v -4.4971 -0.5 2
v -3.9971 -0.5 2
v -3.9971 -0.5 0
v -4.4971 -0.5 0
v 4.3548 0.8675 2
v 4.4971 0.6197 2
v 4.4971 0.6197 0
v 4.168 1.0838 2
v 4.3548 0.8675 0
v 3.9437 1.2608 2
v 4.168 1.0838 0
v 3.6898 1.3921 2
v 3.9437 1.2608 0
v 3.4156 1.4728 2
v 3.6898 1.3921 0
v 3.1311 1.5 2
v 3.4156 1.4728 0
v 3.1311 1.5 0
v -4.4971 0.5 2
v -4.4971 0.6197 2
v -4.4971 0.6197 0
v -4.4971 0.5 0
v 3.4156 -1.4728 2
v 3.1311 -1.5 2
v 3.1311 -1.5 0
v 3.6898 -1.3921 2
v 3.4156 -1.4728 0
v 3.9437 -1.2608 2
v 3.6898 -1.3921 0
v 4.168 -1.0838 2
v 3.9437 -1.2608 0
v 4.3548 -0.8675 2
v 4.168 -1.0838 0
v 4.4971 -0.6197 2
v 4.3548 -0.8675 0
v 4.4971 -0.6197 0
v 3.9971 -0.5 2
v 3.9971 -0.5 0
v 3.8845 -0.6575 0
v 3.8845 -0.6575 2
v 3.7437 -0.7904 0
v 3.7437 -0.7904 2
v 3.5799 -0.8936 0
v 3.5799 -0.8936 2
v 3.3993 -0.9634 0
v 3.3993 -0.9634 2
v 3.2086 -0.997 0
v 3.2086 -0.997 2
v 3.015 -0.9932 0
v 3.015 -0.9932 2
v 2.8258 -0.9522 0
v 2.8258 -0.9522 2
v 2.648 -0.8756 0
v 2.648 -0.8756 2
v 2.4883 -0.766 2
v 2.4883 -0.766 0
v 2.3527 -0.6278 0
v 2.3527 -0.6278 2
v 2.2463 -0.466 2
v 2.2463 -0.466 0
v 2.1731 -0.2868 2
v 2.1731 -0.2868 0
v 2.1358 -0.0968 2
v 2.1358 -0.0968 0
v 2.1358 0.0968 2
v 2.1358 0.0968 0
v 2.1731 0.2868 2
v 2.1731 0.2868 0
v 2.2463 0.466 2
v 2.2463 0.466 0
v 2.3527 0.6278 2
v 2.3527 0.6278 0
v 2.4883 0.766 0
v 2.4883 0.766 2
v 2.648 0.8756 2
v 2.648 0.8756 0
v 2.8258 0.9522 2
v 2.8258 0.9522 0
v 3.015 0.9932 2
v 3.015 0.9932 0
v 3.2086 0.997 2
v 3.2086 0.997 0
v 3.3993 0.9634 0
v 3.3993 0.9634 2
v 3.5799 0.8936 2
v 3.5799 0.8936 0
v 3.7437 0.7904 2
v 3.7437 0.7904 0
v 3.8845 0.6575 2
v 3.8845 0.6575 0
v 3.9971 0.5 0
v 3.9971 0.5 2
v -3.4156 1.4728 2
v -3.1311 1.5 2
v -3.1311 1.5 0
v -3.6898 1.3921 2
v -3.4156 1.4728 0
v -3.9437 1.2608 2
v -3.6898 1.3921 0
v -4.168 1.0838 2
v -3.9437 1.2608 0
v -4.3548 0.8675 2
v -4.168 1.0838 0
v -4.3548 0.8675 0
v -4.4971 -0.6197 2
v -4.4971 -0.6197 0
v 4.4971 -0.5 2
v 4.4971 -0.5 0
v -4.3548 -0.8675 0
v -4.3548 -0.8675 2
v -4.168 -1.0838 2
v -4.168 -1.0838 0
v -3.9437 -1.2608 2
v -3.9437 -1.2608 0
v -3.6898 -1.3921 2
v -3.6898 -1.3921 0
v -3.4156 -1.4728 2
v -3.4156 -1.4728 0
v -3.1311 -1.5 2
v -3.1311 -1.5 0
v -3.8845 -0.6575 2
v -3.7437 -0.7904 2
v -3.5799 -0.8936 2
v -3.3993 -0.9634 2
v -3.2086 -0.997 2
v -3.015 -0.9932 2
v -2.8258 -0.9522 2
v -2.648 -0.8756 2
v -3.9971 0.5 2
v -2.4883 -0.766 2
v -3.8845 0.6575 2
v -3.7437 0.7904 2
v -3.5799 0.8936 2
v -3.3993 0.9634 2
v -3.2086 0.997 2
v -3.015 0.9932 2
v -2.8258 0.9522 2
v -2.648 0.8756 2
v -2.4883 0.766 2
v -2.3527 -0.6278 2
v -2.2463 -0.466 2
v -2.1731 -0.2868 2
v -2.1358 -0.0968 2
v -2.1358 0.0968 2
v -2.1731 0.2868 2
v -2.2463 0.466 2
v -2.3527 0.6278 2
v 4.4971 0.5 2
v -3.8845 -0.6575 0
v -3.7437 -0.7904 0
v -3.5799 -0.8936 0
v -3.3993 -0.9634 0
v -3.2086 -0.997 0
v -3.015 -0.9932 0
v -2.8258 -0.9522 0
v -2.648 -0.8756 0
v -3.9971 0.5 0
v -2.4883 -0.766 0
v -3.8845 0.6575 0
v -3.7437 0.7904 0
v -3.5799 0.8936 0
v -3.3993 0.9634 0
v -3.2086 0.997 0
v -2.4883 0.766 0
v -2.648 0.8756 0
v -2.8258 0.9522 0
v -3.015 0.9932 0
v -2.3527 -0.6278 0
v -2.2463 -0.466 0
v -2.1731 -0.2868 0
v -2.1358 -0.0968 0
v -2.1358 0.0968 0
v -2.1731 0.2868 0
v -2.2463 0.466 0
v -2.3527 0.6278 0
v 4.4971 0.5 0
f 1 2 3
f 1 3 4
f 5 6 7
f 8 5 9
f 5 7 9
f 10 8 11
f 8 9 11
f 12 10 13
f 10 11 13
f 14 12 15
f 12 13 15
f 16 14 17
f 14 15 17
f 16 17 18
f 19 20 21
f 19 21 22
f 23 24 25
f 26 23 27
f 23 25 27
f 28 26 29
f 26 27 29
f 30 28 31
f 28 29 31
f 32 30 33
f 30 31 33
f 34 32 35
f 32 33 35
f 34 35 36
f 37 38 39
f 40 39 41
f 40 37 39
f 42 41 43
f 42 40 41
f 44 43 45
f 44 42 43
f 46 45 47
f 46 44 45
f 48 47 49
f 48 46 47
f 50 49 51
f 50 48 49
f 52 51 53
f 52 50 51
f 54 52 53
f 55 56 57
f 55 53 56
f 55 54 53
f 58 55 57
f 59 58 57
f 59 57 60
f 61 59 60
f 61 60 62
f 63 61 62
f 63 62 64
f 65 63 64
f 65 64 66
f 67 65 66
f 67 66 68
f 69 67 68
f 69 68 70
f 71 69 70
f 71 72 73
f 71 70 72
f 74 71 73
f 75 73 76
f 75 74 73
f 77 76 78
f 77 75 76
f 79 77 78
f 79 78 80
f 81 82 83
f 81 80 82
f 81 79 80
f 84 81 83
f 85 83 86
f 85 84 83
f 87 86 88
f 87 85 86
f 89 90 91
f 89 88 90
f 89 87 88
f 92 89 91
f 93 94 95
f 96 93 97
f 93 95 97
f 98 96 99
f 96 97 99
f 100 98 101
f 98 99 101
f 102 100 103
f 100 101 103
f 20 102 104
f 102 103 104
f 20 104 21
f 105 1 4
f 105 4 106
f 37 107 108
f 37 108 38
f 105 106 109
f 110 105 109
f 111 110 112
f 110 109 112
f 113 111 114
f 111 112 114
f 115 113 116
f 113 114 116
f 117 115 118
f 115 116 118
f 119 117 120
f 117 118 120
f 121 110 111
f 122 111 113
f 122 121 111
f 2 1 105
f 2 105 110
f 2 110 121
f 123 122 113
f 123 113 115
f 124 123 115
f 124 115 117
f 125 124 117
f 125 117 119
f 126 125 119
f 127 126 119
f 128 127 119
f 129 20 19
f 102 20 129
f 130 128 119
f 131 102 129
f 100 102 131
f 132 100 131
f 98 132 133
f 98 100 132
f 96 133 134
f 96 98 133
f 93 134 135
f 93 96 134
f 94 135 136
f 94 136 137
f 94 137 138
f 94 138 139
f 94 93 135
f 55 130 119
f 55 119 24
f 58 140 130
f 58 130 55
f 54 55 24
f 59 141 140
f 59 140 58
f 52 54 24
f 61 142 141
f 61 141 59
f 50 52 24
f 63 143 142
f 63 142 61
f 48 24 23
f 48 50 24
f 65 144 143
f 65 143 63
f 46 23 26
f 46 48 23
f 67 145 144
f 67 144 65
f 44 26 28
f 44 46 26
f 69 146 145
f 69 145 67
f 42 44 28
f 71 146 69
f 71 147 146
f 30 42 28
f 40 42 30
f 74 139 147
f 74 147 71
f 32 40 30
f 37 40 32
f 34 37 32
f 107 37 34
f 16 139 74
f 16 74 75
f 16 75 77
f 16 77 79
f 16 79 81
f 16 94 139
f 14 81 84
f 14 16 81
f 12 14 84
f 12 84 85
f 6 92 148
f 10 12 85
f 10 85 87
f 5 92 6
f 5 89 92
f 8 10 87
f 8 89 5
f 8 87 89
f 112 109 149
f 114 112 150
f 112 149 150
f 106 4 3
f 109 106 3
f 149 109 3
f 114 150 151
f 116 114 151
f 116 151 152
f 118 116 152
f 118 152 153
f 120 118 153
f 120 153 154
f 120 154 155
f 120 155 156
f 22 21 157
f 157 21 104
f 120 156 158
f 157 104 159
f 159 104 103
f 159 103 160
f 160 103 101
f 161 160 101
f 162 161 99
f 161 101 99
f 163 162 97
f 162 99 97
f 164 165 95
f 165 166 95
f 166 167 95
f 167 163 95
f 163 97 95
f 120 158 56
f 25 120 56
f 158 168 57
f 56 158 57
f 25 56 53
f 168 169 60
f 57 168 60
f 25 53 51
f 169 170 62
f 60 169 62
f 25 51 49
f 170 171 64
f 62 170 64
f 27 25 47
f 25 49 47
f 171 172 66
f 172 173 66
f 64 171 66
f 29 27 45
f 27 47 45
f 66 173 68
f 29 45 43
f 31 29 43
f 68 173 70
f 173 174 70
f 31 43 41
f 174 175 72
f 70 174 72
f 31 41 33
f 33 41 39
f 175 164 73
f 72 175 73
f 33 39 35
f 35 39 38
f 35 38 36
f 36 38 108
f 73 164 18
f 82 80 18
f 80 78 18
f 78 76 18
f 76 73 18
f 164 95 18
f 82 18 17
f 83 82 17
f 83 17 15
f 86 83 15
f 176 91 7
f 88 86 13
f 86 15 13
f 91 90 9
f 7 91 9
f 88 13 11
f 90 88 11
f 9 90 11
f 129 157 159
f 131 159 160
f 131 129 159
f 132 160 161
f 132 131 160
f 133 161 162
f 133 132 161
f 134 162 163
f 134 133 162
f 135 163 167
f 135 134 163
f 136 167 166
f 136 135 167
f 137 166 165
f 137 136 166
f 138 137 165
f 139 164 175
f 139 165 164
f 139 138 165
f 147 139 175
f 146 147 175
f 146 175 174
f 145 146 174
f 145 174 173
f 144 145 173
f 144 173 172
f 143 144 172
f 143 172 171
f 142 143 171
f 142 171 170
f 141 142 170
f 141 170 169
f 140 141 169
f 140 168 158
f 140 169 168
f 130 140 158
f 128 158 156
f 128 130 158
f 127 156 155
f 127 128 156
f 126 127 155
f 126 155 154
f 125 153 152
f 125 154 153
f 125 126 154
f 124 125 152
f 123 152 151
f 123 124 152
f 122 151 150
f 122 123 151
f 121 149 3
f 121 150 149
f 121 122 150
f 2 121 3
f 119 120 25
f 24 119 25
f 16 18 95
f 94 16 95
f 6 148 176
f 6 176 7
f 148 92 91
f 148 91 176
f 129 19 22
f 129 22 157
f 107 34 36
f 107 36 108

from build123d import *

# Parameters (mm, degrees)
SKETCH_1_R          = 1.5
EXTRUDE_1_DEPTH     = 2
CUT_EXTRUDE_1_DEPTH = 3


with BuildPart() as part:
    # 草图1 → 凸台-拉伸1 (new body)
    with BuildSketch(Plane.XY):
        with Locations((-3.13109105, 0)):
            Circle(SKETCH_1_R)
        with BuildLine():
            Line((3.13109105, 1.5), (-3.13109105, 1.5))
            ThreePointArc((-3.13109105, 1.5), (-2.070430878, 1.060660172), (-1.63109105, 0))
            ThreePointArc((-1.63109105, 0), (-2.070430878, -1.060660172), (-3.13109105, -1.5))
            Line((-3.13109105, -1.5), (3.13109105, -1.5))
            ThreePointArc((3.13109105, -1.5), (1.63109105, 0), (3.13109105, 1.5))
        make_face()
        with Locations((3.13109105, 0)):
            Circle(SKETCH_1_R)
    extrude(amount=EXTRUDE_1_DEPTH)

    # 草图2 → 切除-拉伸1 (cut)
    with BuildSketch(Plane.XY.offset(2)):
        with BuildLine():
            Line((-3.997116454, -0.5), (-4.497116454, -0.5))
            Line((-4.497116454, -0.5), (-4.497116454, -0.619656837))
            ThreePointArc((-4.497116454, -0.619656837), (-4.63109105, 0), (-4.497116454, 0.619656837))
            Line((-4.497116454, 0.619656837), (-4.497116454, 0.5))
            Line((-4.497116454, 0.5), (-3.997116454, 0.5))
            ThreePointArc((-3.997116454, 0.5), (-2.13109105, 0), (-3.997116454, -0.5))
        make_face()
        with BuildLine():
            Line((3.997116454, 0.5), (4.497116454, 0.5))
            Line((4.497116454, 0.5), (4.497116454, 0.619656837))
            ThreePointArc((4.497116454, 0.619656837), (4.63109105, 0), (4.497116454, -0.619656837))
            Line((4.497116454, -0.619656837), (4.497116454, -0.5))
            Line((4.497116454, -0.5), (3.997116454, -0.5))
            ThreePointArc((3.997116454, -0.5), (2.13109105, 0), (3.997116454, 0.5))
        make_face()
    extrude(amount=-CUT_EXTRUDE_1_DEPTH, mode=Mode.SUBTRACT)


solid = part.part
